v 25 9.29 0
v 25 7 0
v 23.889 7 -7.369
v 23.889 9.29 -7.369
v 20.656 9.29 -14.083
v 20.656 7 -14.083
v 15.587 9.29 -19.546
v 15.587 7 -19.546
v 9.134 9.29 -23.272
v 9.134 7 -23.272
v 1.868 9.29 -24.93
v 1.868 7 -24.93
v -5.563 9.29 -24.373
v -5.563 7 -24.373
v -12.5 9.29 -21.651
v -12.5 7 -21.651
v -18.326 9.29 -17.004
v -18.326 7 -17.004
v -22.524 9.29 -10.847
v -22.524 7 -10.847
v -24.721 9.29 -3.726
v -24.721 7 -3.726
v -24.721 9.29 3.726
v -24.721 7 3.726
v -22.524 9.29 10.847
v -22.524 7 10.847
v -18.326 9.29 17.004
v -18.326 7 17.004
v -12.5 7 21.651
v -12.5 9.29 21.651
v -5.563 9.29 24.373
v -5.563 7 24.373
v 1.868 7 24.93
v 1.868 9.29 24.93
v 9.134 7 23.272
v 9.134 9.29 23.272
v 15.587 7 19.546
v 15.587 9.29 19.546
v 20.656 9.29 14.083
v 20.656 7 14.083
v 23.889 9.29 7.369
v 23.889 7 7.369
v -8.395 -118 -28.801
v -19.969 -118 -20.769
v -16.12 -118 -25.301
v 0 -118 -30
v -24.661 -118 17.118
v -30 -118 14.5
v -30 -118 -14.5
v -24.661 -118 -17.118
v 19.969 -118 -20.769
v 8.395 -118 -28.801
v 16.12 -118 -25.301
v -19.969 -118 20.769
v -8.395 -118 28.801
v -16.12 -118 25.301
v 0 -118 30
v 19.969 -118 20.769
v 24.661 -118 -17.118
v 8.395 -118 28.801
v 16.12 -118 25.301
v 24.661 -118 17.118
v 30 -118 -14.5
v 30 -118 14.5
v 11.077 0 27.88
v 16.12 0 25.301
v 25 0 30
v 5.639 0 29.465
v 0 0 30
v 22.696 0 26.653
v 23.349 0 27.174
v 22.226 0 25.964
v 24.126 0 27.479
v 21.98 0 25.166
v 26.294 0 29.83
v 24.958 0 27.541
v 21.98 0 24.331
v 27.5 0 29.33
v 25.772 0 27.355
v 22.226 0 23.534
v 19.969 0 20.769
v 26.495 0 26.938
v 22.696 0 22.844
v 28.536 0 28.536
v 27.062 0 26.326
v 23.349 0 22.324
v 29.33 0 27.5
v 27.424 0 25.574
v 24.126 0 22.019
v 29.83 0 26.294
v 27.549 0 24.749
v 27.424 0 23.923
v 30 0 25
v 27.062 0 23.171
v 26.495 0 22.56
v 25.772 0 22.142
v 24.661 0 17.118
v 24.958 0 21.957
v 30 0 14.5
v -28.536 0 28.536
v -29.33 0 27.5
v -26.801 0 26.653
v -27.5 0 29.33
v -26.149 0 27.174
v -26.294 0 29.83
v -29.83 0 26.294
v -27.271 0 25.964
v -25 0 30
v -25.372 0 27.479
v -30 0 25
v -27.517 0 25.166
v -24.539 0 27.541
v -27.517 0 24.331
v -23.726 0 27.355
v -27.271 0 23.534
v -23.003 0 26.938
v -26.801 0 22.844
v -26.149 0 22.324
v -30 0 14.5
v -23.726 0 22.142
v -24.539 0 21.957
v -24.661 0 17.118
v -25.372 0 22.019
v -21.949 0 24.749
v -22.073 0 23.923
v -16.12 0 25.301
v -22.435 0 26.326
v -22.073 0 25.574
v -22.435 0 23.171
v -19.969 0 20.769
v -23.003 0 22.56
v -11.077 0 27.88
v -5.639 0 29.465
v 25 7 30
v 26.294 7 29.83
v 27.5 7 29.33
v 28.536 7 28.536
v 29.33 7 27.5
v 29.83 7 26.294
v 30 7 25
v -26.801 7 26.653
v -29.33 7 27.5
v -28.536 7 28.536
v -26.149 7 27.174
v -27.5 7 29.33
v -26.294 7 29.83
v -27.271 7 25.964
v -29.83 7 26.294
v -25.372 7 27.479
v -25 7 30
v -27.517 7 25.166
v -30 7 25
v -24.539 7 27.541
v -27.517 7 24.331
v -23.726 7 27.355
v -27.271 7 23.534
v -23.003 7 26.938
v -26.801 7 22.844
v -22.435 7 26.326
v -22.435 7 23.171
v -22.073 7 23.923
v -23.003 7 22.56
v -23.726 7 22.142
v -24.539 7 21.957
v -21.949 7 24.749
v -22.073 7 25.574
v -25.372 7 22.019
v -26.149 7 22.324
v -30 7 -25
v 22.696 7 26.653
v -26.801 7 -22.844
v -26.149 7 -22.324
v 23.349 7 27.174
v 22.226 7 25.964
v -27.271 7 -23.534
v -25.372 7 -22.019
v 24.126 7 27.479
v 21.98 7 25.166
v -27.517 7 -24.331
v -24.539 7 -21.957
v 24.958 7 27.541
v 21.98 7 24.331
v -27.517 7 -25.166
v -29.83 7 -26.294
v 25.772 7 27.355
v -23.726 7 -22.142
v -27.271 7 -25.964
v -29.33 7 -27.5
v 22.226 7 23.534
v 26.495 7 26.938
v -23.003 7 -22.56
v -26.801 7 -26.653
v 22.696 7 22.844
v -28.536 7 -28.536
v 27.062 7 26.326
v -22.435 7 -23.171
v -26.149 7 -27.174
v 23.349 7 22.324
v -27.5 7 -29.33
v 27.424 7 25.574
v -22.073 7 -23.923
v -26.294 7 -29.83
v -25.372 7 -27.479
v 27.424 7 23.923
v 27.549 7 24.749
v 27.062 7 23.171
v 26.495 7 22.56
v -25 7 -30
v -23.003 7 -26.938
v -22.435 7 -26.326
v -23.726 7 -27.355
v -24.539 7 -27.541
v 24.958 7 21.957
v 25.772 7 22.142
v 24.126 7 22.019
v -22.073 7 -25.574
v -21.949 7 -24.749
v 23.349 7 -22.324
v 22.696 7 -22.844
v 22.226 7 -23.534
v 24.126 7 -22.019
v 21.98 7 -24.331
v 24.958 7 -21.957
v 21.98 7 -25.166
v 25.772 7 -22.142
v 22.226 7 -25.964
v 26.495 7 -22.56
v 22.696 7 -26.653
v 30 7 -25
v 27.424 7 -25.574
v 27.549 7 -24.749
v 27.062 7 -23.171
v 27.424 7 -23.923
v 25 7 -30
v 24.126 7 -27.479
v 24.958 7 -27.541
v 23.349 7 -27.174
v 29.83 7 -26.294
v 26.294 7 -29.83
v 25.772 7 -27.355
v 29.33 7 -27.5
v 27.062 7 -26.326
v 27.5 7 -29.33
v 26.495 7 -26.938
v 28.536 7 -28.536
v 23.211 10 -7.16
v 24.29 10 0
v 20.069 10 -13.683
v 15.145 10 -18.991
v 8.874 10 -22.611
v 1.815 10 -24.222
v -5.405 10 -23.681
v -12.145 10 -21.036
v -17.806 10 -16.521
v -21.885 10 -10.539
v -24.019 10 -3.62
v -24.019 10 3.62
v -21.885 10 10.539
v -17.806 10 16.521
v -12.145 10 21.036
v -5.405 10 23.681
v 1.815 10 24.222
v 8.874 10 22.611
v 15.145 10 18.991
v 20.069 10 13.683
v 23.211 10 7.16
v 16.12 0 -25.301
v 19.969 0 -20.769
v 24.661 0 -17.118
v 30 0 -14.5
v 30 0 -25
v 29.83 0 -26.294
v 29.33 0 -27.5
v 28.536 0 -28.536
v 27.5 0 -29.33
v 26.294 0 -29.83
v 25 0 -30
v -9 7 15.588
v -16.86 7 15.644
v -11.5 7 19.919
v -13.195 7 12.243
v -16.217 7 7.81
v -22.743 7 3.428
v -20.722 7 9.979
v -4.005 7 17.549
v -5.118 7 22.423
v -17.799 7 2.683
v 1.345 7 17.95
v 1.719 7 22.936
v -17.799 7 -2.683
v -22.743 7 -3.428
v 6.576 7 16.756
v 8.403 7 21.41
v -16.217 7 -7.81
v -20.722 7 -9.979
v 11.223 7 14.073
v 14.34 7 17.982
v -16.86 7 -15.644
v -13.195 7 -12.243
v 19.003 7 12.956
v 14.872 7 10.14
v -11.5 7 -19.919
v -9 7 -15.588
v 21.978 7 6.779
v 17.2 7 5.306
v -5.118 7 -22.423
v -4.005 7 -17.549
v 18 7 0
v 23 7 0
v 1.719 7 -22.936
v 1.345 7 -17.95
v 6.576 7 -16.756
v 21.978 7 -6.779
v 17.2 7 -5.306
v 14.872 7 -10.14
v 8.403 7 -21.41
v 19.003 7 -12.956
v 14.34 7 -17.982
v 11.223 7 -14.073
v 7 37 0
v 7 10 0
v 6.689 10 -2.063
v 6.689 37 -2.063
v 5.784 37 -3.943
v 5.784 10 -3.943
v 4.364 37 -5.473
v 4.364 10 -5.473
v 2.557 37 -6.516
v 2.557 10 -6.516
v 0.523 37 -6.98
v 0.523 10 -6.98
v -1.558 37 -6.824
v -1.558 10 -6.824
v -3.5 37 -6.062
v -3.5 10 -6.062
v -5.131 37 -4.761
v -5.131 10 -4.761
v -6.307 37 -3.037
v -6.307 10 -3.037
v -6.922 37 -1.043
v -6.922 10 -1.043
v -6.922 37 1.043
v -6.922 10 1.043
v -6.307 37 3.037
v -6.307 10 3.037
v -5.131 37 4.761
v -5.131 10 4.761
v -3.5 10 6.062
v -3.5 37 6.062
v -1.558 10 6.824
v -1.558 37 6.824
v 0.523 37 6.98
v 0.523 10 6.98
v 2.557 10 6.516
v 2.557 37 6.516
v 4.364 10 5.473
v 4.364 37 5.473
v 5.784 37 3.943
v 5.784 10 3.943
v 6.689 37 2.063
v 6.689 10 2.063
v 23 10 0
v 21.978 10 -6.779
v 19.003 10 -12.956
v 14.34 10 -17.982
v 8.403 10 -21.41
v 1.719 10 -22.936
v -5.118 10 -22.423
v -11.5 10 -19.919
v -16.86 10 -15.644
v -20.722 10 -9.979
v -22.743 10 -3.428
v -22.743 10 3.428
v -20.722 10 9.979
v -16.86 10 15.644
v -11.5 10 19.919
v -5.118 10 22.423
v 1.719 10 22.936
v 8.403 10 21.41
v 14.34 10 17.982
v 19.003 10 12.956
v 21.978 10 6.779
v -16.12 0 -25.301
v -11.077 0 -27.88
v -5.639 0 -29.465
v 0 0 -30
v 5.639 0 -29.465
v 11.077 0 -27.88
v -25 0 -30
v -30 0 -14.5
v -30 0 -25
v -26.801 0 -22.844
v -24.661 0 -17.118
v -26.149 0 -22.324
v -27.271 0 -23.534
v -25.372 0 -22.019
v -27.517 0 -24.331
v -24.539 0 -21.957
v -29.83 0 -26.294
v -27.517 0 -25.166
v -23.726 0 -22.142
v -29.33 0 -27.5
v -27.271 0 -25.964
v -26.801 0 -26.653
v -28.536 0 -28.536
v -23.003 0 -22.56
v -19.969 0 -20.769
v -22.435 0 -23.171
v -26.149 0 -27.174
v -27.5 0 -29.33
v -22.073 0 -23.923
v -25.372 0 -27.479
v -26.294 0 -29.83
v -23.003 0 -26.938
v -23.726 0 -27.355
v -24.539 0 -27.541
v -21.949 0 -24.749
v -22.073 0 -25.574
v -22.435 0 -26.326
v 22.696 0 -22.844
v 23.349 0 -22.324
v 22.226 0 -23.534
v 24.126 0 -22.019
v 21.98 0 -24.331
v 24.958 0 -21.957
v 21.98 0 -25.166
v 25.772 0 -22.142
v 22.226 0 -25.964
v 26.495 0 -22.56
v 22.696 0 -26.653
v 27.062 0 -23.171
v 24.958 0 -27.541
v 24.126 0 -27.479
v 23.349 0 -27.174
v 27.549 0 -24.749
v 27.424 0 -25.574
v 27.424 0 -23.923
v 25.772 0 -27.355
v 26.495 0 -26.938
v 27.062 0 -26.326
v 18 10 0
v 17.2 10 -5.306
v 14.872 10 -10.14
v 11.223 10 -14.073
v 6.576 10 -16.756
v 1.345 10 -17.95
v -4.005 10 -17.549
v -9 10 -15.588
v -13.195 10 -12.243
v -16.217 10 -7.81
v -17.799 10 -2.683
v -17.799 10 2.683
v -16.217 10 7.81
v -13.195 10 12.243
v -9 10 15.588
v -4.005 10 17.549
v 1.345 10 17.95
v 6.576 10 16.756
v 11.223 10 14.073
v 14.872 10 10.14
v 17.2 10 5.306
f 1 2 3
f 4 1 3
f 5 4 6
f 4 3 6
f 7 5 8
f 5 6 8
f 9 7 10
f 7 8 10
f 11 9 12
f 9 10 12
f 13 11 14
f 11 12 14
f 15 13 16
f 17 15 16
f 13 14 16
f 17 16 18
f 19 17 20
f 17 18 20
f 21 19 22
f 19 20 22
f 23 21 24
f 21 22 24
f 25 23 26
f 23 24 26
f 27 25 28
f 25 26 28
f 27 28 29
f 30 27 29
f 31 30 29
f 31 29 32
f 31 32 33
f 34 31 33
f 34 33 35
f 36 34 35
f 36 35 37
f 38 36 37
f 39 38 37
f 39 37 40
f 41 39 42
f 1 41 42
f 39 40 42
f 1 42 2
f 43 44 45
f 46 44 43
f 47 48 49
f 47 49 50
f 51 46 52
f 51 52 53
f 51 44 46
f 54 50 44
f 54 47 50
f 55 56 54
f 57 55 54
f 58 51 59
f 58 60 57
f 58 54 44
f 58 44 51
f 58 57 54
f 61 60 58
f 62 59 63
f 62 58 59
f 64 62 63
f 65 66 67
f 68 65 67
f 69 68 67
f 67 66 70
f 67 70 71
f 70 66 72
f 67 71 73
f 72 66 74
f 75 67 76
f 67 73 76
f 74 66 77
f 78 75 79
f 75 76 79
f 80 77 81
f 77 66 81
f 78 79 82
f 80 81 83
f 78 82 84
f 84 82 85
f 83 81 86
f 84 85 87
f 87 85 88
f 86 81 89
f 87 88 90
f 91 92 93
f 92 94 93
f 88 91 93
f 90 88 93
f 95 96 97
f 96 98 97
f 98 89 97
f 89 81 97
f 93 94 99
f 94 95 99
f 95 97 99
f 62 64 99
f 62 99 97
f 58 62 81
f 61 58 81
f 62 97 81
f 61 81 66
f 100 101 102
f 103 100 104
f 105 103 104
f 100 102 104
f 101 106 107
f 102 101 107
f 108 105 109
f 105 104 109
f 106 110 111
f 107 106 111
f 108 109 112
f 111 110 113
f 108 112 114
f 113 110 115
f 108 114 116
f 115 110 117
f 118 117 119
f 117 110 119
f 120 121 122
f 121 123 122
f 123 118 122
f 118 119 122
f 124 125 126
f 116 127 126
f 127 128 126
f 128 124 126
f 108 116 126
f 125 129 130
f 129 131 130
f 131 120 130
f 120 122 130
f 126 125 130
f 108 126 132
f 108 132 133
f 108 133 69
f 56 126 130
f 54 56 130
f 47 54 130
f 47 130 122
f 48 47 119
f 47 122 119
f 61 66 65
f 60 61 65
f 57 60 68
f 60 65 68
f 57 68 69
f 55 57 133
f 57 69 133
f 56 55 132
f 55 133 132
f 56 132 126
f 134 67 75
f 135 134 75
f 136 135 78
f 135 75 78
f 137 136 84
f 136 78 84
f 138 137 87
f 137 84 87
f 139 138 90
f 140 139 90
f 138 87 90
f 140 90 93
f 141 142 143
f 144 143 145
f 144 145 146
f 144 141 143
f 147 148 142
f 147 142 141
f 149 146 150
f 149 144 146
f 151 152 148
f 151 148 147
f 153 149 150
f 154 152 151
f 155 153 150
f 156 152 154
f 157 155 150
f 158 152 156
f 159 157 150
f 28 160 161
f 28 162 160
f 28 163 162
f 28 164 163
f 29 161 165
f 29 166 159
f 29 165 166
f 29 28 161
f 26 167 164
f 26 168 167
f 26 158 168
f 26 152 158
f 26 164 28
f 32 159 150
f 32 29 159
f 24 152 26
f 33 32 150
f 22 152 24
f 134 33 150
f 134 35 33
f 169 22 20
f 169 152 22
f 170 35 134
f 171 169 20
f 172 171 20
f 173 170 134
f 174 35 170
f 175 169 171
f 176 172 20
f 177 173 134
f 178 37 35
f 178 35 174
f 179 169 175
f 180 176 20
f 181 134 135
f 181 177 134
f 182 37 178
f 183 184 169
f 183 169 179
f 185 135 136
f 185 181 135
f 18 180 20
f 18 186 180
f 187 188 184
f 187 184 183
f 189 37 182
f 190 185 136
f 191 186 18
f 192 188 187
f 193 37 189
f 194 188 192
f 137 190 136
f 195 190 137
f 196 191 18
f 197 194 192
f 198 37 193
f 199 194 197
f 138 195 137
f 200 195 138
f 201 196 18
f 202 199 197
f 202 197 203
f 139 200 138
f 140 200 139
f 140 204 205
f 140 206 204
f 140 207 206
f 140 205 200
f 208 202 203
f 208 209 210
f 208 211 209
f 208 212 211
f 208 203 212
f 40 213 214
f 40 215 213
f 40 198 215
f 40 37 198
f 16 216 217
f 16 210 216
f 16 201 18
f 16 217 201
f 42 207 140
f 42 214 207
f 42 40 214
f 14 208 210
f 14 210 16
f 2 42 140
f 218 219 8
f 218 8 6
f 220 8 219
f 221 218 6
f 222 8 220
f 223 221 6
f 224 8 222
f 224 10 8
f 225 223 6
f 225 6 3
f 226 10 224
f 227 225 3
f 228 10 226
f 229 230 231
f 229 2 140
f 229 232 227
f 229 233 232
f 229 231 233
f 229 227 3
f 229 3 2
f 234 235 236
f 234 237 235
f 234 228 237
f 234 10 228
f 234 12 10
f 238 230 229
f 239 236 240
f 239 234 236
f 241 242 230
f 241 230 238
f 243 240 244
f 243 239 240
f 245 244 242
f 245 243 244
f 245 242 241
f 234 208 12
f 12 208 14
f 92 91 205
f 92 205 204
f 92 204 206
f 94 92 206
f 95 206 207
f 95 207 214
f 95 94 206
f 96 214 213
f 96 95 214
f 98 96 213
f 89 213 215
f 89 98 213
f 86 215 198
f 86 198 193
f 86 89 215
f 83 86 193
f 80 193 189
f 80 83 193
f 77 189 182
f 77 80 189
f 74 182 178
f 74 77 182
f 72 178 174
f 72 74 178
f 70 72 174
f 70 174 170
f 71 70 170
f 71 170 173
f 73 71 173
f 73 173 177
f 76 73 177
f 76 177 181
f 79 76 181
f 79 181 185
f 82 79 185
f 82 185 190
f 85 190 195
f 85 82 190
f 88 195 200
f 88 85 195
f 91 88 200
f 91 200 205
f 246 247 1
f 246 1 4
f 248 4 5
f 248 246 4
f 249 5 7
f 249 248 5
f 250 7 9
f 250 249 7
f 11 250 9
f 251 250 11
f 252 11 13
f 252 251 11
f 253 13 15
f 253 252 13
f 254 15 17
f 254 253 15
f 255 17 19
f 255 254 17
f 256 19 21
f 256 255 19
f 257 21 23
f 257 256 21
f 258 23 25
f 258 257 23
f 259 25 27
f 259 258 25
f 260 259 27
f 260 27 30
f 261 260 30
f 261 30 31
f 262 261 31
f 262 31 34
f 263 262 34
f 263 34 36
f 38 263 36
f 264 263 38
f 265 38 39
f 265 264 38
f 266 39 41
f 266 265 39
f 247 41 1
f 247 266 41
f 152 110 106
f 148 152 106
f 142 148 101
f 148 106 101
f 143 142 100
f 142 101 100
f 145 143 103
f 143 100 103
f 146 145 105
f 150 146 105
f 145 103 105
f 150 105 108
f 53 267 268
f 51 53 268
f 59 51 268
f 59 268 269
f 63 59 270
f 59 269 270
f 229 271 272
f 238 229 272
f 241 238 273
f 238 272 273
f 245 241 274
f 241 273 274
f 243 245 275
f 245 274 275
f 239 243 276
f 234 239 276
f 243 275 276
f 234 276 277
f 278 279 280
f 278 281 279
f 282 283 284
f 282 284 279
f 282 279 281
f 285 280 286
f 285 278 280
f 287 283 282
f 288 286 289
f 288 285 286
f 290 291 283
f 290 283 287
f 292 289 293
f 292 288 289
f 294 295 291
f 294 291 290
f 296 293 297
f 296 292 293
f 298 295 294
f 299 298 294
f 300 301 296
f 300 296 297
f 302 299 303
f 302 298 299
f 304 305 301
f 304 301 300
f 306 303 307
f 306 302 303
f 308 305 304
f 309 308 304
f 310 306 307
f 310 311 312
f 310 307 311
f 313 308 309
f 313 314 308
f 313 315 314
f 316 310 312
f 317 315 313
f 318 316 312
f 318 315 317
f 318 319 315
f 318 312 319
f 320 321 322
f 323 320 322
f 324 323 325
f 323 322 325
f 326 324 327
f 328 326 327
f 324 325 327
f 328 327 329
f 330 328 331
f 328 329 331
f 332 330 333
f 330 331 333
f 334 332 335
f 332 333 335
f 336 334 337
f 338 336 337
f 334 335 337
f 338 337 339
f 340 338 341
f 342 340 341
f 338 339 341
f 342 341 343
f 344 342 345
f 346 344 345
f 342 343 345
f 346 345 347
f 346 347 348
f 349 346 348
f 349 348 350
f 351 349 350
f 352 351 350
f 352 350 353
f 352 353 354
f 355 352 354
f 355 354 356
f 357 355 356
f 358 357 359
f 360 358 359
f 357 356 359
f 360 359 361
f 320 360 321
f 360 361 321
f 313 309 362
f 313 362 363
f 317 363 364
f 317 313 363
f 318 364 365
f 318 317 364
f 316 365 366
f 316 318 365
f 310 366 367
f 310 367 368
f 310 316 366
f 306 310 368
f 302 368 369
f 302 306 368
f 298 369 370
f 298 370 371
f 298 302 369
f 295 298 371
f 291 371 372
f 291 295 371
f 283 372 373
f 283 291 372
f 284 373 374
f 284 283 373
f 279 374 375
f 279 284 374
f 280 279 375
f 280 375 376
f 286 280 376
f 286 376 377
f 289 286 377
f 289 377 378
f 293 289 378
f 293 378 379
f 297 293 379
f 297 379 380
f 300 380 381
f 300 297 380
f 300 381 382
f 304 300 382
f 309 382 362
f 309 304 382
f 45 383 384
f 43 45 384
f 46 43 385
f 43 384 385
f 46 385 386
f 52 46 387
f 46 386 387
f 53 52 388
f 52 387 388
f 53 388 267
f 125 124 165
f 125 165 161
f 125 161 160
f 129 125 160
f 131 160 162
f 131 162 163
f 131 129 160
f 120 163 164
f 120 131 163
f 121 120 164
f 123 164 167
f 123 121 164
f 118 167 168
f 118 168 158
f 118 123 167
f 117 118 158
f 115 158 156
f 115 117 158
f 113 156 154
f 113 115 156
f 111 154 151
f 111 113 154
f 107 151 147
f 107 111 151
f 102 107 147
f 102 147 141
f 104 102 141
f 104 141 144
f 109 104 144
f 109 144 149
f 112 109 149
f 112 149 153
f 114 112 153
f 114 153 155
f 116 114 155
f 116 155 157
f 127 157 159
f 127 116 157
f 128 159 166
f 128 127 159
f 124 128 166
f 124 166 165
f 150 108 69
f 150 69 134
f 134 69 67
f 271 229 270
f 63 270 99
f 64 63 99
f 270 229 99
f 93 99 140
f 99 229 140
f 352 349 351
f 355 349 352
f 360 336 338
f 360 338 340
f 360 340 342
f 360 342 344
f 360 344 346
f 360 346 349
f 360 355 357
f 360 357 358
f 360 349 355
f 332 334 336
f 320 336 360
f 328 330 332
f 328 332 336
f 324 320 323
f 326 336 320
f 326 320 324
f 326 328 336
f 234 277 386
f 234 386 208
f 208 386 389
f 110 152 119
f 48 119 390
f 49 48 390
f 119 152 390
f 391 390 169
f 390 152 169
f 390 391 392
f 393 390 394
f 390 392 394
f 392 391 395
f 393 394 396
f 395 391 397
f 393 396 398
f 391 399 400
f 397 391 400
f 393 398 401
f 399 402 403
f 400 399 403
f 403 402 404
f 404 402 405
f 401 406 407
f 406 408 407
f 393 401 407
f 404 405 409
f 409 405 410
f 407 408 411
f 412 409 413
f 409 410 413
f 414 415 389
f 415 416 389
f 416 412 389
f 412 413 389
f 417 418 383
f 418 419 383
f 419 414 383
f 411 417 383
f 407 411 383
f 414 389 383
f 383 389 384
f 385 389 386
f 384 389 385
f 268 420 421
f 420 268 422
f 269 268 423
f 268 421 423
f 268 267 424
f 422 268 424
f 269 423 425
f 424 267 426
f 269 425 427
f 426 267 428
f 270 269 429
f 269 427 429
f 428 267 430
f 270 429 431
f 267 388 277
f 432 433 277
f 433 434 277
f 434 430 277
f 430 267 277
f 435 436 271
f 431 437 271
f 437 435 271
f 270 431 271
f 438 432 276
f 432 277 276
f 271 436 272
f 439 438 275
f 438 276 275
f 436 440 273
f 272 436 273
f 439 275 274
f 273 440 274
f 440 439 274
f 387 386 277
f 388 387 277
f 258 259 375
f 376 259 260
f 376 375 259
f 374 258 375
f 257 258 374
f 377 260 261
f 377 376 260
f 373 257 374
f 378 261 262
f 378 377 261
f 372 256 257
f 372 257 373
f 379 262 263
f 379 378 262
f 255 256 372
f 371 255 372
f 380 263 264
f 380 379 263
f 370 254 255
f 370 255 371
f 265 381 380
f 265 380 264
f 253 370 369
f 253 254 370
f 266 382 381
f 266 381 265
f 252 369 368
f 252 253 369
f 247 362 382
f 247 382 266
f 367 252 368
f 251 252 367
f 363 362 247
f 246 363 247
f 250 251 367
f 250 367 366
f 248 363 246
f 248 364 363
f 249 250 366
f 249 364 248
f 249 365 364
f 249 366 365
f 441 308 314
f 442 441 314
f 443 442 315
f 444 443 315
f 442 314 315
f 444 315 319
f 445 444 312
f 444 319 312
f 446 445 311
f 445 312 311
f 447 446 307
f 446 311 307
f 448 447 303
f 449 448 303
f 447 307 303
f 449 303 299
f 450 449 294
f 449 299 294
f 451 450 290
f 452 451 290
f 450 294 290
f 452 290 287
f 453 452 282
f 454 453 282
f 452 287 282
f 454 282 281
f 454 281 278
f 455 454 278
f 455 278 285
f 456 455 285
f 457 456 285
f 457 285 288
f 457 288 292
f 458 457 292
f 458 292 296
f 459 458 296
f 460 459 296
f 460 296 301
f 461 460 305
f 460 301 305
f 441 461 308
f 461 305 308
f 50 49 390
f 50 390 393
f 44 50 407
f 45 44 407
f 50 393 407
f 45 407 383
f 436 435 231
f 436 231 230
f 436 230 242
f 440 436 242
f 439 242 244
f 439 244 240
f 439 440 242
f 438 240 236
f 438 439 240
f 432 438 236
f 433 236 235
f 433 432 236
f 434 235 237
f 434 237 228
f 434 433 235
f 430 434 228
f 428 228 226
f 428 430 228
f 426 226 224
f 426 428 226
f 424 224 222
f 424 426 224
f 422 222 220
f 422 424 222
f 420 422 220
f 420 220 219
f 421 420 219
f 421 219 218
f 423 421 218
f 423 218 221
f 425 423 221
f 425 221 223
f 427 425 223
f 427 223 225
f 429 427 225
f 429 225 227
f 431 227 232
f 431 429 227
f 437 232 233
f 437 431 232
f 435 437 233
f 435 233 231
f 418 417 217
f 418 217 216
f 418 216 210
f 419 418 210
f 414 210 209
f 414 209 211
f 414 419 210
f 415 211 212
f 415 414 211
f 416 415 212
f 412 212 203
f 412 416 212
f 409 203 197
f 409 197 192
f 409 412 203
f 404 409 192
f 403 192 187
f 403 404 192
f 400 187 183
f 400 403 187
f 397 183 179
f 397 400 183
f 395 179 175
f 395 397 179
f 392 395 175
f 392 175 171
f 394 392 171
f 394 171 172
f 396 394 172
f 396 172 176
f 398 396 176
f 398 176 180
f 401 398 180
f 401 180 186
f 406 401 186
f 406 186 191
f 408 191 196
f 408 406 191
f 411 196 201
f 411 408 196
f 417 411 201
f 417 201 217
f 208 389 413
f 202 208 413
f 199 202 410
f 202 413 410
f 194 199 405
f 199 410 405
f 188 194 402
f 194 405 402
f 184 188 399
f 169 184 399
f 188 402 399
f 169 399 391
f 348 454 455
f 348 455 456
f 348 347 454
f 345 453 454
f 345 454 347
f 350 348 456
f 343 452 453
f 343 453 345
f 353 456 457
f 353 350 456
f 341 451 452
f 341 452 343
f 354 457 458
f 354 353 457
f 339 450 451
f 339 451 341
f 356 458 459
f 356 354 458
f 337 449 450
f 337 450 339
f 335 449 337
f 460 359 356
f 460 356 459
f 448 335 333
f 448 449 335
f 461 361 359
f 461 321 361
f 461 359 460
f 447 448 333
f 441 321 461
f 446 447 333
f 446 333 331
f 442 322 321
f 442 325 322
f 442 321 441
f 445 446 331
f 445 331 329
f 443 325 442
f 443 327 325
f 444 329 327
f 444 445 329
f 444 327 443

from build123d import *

# Parameters (mm, degrees)
SKETCH1_R           = 2.8
BOSS_EXTRUDE1_DEPTH = 7
SKETCH2_R           = 25
SKETCH2_R_2         = 23
SKETCH2_R_3         = 18
BOSS_EXTRUDE3_DEPTH = 3
CHAMFER2_SIZE       = 0.71
BOSS_EXTRUDE4_DEPTH = 118
SKETCH5_R           = 7
BOSS_EXTRUDE5_DEPTH = 27


with BuildPart() as part:
    # Sketch1 → Boss-Extrude1 (new body)
    with BuildSketch(Plane(origin=(0, 0, 0), x_dir=(1, 0, 0), z_dir=(0, 1, 0))):
        with BuildLine():
            Line((-25, -30), (25, -30))
            ThreePointArc((25, -30), (28.535533906, -28.535533906), (30, -25))
            Line((30, -25), (30, 25))
            ThreePointArc((30, 25), (28.535533906, 28.535533906), (25, 30))
            Line((25, 30), (-25, 30))
            ThreePointArc((-25, 30), (-28.535533906, 28.535533906), (-30, 25))
            Line((-30, 25), (-30, -25))
            ThreePointArc((-30, -25), (-28.535533906, -28.535533906), (-25, -30))
        make_face()
        with Locations((-24.748737342, 24.748737342)):
            Circle(SKETCH1_R, mode=Mode.SUBTRACT)
        with Locations((24.748737342, 24.748737342)):
            Circle(SKETCH1_R, mode=Mode.SUBTRACT)
        with Locations((24.748737342, -24.748737342)):
            Circle(SKETCH1_R, mode=Mode.SUBTRACT)
        with Locations((-24.748737342, -24.748737342)):
            Circle(SKETCH1_R, mode=Mode.SUBTRACT)
    extrude(amount=BOSS_EXTRUDE1_DEPTH)

    # Sketch2 → Boss-Extrude3 (add)
    with BuildSketch(Plane(origin=(0, 7, 0), x_dir=(1, 0, 0), z_dir=(0, 1, 0))):
        Circle(SKETCH2_R)
        Circle(SKETCH2_R_2, mode=Mode.SUBTRACT)
        Circle(SKETCH2_R_3)
    extrude(amount=BOSS_EXTRUDE3_DEPTH)

    # Chamfer2
    chamfer2_edges = [part.edges().sort_by_distance(p)[0] for p in [
        (-25, 10, 0),
    ]]
    chamfer(chamfer2_edges, length=CHAMFER2_SIZE)

    # Sketch3 → Boss-Extrude4 (add)
    with BuildSketch(Plane.XZ):
        with BuildLine():
            Line((-30, 14.5), (-30, -14.5))
            ThreePointArc((-30, -14.5), (-22.221450139, -18.82296717), (-16.12, -25.30109879))
            ThreePointArc((-16.12, -25.30109879), (0, -30), (16.12, -25.30109879))
            ThreePointArc((16.12, -25.30109879), (22.221450139, -18.82296717), (30, -14.5))
            Line((30, -14.5), (30, 14.5))
            ThreePointArc((30, 14.5), (22.221450139, 18.82296717), (16.12, 25.30109879))
            ThreePointArc((16.12, 25.30109879), (0, 30), (-16.12, 25.30109879))
            ThreePointArc((-16.12, 25.30109879), (-22.221450139, 18.82296717), (-30, 14.5))
        make_face()
    extrude(amount=BOSS_EXTRUDE4_DEPTH)

    # Sketch5 → Boss-Extrude5 (add)
    with BuildSketch(Plane(origin=(0, 10, 0), x_dir=(1, 0, 0), z_dir=(0, 1, 0))):
        Circle(SKETCH5_R)
    extrude(amount=BOSS_EXTRUDE5_DEPTH)


solid = part.part
